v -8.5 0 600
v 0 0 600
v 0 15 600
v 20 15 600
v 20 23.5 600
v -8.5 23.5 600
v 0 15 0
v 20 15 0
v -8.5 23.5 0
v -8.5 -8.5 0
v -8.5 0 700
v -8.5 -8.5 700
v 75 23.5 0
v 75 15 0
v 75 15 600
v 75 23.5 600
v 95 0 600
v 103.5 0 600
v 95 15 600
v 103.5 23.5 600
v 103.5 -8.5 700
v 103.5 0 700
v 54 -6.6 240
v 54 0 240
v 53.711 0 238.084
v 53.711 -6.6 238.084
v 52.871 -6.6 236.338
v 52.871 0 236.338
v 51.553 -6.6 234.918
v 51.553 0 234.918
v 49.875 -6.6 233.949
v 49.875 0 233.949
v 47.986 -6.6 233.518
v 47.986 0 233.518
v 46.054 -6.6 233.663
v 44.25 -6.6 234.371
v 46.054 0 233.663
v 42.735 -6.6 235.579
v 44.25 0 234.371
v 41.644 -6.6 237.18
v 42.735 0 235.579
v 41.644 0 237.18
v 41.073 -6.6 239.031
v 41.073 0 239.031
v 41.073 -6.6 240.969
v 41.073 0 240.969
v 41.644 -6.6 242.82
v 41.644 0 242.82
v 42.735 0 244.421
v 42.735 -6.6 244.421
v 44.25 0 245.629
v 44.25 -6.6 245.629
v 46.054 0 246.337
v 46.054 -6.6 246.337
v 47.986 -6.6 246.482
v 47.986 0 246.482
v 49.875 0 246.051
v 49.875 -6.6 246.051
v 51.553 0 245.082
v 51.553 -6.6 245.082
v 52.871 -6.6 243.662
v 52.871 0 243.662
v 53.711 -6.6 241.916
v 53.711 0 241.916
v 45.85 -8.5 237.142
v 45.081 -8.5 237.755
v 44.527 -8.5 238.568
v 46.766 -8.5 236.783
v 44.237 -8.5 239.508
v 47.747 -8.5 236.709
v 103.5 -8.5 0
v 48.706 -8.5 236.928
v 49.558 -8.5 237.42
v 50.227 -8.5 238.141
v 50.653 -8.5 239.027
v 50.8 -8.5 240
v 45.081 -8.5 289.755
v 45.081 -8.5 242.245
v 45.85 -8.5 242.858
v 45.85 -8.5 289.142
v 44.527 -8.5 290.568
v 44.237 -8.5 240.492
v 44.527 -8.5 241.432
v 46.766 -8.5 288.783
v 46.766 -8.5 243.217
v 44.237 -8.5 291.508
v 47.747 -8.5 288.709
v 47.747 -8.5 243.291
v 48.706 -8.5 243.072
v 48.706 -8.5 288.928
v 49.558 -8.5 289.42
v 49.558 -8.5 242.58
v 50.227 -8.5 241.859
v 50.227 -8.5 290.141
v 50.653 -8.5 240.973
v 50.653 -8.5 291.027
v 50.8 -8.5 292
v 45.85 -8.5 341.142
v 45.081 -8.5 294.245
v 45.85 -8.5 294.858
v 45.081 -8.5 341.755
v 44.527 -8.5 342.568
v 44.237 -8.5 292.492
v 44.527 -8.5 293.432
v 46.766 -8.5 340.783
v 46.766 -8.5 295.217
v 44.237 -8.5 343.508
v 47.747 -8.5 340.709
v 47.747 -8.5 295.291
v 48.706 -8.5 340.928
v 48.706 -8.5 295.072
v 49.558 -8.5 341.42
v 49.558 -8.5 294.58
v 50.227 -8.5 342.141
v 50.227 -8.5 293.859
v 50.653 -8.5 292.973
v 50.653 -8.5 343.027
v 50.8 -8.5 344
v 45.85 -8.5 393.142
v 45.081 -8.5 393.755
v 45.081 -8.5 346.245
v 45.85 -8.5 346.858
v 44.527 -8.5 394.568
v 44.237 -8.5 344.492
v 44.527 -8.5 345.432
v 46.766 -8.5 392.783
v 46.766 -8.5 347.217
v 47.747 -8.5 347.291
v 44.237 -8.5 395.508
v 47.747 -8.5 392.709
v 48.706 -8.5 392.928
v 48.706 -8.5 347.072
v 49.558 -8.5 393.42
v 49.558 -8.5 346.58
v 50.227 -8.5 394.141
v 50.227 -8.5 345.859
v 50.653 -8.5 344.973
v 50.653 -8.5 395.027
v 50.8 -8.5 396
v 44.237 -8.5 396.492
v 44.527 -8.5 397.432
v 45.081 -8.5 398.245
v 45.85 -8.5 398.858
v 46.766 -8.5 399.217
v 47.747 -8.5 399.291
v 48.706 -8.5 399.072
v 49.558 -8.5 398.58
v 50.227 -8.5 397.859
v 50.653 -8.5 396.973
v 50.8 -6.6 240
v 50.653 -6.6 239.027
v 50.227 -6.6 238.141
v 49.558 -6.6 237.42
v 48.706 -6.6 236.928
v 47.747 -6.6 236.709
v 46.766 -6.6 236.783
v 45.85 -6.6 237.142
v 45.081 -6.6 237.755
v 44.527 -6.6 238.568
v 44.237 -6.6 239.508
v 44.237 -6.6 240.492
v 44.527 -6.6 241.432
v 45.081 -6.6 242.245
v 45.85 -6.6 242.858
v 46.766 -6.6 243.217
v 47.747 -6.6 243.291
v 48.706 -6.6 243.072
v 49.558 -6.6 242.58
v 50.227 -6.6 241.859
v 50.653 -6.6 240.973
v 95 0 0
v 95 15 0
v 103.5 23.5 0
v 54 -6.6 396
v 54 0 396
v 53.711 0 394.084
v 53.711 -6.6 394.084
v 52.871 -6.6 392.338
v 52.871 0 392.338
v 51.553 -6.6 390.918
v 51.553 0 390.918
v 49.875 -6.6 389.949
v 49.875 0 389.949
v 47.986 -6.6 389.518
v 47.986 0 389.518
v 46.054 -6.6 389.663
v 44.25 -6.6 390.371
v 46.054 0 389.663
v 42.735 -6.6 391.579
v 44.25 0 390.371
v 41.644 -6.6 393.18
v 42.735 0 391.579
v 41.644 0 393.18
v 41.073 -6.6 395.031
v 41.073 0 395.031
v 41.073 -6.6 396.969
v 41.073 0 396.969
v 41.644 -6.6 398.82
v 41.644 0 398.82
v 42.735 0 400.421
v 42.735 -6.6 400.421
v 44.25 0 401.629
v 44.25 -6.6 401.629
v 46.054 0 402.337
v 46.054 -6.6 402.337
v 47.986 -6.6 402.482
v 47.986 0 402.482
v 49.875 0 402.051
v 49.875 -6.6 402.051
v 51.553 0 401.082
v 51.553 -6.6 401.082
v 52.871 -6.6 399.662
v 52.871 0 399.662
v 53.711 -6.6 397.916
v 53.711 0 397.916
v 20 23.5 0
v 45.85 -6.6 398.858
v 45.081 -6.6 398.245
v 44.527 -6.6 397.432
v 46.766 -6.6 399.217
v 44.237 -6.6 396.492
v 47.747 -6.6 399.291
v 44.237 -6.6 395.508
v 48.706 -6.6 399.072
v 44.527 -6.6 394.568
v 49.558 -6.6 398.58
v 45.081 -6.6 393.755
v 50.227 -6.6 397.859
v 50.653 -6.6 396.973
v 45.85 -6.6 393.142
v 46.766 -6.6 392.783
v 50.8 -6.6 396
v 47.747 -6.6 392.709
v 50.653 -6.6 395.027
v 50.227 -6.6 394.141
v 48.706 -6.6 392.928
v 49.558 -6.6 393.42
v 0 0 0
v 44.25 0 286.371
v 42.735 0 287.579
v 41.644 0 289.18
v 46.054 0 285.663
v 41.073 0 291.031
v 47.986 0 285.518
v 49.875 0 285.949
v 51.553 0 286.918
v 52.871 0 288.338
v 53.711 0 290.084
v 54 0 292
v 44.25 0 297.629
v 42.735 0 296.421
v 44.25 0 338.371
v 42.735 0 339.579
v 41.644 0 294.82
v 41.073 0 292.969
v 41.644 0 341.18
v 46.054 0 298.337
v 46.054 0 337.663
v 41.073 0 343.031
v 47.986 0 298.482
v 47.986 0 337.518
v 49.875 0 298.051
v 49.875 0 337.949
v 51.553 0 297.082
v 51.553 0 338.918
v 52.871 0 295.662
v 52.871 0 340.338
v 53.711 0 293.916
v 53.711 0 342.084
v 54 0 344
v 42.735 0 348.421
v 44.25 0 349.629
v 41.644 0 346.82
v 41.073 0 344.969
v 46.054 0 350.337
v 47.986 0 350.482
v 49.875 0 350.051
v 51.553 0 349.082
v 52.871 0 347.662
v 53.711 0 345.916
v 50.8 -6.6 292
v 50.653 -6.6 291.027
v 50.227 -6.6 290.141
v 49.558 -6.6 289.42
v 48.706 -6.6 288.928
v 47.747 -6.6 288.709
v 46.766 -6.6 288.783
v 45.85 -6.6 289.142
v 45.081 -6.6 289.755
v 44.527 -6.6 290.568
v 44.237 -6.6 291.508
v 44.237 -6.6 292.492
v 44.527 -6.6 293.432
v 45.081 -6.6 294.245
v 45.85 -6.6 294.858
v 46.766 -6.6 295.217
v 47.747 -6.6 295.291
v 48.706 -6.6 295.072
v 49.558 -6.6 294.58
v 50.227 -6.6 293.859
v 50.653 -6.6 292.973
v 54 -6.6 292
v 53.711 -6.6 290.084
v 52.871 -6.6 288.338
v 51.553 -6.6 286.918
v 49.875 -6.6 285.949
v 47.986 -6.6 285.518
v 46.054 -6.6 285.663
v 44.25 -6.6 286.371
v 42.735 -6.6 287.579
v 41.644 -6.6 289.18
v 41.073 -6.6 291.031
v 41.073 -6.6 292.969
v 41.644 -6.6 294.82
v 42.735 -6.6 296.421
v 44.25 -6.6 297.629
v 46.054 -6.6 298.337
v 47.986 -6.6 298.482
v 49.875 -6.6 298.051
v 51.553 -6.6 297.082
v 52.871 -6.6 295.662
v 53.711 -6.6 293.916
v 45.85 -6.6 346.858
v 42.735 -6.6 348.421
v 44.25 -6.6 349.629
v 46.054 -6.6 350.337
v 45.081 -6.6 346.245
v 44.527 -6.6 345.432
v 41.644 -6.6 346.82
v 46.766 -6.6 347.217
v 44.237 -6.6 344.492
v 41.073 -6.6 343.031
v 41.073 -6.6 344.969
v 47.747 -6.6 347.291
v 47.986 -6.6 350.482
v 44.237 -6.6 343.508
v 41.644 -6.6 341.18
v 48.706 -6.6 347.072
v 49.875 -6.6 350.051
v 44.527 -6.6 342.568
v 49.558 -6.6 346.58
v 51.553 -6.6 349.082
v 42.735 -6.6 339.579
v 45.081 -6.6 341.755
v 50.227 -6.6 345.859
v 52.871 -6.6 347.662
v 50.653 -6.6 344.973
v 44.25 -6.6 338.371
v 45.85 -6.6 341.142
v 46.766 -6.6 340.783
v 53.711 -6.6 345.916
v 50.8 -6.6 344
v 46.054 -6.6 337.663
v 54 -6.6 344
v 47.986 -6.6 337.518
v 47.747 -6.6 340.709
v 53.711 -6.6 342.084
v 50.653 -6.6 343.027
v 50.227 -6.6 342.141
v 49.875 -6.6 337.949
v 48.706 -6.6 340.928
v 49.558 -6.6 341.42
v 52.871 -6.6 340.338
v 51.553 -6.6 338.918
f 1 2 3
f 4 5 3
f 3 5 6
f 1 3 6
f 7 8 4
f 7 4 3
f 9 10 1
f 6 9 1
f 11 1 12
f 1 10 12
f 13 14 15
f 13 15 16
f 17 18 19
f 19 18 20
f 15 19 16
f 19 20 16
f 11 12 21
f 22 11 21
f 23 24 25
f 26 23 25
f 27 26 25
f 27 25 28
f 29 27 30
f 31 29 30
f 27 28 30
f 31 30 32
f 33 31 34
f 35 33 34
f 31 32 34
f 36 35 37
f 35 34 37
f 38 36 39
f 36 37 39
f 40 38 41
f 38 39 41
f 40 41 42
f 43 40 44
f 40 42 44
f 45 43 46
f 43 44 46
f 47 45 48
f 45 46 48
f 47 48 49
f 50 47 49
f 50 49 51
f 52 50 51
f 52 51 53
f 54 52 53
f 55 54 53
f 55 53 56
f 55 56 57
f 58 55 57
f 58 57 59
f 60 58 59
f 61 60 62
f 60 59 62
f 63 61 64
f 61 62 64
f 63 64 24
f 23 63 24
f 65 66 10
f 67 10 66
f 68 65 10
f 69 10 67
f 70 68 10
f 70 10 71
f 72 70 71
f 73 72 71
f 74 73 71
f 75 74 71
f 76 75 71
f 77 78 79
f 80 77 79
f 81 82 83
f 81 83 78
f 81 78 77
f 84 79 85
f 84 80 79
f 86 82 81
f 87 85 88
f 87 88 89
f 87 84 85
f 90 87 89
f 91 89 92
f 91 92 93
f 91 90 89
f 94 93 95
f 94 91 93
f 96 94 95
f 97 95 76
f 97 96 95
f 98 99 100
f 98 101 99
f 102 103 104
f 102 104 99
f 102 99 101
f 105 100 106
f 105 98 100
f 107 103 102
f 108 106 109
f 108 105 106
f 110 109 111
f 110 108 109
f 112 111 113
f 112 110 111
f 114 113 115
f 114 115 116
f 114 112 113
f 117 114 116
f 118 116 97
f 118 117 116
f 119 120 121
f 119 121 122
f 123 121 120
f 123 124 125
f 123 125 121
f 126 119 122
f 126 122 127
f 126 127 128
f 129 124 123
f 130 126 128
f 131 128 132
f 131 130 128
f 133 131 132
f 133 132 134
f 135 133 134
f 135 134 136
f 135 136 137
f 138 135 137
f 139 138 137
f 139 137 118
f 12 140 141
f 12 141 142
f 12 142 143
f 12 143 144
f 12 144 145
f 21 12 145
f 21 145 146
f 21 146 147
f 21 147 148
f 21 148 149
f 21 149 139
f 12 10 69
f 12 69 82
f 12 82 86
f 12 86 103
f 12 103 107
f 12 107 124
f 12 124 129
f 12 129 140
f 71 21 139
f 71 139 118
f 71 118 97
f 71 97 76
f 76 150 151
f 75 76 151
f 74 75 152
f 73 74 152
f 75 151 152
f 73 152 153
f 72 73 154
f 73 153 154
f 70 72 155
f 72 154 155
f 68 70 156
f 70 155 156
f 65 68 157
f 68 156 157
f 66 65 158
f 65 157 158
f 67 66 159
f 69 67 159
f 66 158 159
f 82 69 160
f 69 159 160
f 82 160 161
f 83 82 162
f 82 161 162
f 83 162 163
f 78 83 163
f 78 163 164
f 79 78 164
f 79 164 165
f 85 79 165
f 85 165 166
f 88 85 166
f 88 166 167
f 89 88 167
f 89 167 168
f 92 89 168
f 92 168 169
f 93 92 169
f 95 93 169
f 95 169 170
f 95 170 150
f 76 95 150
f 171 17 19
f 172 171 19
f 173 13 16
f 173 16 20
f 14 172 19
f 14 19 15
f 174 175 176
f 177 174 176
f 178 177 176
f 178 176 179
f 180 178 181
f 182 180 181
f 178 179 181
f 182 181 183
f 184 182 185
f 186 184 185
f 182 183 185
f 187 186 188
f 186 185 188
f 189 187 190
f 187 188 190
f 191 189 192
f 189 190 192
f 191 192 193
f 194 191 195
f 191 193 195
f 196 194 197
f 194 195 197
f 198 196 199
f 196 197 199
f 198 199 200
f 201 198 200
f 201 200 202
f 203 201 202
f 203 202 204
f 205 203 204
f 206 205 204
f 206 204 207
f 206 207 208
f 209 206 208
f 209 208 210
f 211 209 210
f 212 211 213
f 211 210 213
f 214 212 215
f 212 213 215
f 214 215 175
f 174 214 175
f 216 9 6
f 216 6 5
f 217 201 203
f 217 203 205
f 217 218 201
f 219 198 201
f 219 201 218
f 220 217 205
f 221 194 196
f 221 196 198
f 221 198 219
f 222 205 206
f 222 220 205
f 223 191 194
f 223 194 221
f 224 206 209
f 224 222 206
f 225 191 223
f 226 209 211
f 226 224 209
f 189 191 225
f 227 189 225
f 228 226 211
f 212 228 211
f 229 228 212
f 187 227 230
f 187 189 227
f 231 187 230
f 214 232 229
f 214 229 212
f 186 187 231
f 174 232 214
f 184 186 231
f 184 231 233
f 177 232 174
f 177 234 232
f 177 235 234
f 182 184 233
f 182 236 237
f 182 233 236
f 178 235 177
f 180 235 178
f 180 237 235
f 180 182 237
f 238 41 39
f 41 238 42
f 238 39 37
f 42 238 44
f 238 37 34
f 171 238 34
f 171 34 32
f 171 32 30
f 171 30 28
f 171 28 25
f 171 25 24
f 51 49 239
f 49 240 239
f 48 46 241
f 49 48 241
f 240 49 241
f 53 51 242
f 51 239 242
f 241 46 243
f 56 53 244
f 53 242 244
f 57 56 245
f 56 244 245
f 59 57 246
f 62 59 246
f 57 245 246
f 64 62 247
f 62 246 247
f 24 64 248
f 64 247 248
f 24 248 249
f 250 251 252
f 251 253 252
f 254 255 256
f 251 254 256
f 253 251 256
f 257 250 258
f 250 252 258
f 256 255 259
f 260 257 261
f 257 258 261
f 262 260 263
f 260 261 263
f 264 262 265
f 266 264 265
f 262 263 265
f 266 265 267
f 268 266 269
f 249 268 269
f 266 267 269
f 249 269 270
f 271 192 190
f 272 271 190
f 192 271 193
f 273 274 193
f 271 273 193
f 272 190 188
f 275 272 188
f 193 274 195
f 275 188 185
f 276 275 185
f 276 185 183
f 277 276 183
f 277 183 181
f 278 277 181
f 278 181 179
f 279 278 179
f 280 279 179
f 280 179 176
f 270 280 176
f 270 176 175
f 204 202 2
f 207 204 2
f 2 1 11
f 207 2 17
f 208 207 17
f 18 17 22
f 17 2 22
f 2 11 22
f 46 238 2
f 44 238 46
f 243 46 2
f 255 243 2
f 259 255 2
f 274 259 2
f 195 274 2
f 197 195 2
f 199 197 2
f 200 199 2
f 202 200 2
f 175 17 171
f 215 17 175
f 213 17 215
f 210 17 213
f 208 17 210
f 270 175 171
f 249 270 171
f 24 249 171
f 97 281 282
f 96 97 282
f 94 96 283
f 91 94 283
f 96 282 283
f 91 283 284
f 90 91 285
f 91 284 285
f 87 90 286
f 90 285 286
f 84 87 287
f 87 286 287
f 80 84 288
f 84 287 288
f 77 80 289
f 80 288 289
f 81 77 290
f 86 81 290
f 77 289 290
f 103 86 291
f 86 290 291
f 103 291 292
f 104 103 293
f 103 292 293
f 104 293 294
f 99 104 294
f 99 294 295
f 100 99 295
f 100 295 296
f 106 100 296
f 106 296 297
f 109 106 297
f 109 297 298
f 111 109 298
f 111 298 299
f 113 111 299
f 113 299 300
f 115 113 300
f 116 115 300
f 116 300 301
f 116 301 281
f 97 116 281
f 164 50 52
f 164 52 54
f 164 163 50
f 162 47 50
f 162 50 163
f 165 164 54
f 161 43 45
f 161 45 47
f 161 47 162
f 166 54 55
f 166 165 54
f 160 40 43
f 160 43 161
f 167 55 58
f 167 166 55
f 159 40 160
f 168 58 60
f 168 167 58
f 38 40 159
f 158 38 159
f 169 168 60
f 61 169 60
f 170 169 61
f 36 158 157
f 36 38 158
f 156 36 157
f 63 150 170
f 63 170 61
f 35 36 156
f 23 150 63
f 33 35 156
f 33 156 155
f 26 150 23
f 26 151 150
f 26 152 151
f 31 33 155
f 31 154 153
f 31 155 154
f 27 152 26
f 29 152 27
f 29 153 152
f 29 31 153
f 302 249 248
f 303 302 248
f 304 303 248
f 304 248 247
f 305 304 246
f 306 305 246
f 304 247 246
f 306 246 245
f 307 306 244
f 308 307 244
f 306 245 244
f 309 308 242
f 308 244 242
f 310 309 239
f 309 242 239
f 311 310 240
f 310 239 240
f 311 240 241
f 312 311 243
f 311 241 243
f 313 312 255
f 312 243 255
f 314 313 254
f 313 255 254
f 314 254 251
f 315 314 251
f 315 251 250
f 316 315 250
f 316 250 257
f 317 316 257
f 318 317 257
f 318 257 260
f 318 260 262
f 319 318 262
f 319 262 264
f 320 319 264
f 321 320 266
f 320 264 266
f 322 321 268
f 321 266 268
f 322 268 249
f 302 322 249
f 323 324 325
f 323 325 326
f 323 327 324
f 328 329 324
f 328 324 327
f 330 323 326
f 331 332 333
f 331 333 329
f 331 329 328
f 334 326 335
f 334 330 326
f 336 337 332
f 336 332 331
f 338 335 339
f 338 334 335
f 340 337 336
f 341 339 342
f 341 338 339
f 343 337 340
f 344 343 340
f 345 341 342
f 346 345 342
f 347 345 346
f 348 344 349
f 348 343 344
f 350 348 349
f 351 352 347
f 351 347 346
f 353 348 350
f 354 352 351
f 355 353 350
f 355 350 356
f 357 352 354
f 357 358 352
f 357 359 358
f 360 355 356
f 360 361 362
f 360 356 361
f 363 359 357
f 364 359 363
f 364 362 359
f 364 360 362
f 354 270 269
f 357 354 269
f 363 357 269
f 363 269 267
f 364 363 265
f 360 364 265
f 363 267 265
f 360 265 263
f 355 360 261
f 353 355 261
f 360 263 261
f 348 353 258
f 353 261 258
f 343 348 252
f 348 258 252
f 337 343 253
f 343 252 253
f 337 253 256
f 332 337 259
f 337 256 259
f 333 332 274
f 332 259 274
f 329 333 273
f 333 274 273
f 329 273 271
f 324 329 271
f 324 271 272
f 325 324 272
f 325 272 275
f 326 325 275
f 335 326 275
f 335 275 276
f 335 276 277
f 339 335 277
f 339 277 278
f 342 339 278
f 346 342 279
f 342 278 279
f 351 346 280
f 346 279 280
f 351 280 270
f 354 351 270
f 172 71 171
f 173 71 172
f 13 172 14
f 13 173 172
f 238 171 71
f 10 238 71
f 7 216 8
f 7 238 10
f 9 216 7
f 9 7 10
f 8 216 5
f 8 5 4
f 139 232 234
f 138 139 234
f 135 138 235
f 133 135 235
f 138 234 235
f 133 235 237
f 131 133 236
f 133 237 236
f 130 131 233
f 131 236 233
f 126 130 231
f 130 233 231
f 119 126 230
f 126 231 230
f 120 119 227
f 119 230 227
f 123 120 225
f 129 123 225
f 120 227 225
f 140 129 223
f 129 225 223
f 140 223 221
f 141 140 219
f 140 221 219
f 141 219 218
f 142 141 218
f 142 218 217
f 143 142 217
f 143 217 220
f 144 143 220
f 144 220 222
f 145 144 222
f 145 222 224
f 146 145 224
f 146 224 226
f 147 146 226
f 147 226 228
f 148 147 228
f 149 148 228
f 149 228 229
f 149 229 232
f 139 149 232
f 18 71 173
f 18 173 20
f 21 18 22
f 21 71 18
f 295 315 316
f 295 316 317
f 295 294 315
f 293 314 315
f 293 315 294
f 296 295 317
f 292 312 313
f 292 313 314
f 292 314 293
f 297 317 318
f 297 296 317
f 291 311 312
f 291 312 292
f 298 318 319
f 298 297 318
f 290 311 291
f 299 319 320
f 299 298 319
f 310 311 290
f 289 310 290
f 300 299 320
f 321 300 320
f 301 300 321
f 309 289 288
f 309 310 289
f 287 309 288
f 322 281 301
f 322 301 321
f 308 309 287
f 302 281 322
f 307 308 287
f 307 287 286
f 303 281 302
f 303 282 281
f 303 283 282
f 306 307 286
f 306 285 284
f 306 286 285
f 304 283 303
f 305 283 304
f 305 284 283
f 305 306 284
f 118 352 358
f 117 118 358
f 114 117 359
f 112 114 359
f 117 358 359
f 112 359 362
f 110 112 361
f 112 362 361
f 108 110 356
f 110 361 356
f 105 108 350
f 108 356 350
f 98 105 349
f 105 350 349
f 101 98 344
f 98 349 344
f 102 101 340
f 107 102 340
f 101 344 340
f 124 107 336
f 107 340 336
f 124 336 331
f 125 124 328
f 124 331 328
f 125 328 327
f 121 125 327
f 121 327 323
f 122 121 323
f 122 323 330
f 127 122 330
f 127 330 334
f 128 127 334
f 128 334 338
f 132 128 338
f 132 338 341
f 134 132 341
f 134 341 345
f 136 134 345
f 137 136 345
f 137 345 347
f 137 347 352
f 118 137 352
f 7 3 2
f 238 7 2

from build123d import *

# Parameters (mm, degrees)
BOSS_EXTRUDE1_DEPTH = 600
SKETCH4_W           = 112
SKETCH4_H           = 100
BOSS_EXTRUDE2_DEPTH = 8.5
SKETCH6_R           = 3.3
CUT_EXTRUDE1_DEPTH  = 9.5
SKETCH7_R           = 6.5
CUT_EXTRUDE2_DEPTH  = 6.6


with BuildPart() as part:
    # Sketch1 → Boss-Extrude1 (new body)
    with BuildSketch(Plane.XY):
        Polygon((0, 0), (95, 0), (95, 15), (75, 15), (75, 23.5), (103.5, 23.5), (103.5, -8.5), (-8.5, -8.5), (-8.5, 23.5), (20, 23.5), (20, 15), (0, 15), align=None)
    extrude(amount=BOSS_EXTRUDE1_DEPTH)

    # Sketch4 → Boss-Extrude2 (add)
    with BuildSketch(Plane.XZ.offset(8.5)):
        with Locations((47.5, 650)):
            Rectangle(SKETCH4_W, SKETCH4_H)
    extrude(amount=-BOSS_EXTRUDE2_DEPTH)

    # Sketch6 → Cut-Extrude1 (cut, through all)
    with BuildSketch(Plane(origin=(0, 0, 0), x_dir=(1, 0, 0), z_dir=(0, 1, 0))):
        with Locations((47.5, -240)):
            Circle(SKETCH6_R)
        with Locations((47.5, -292)):
            Circle(SKETCH6_R)
        with Locations((47.5, -344)):
            Circle(SKETCH6_R)
        with Locations((47.5, -396)):
            Circle(SKETCH6_R)
    extrude(amount=-CUT_EXTRUDE1_DEPTH, mode=Mode.SUBTRACT)

    # Sketch7 → Cut-Extrude2 (cut)
    with BuildSketch(Plane(origin=(0, 0, 0), x_dir=(1, 0, 0), z_dir=(0, 1, 0))):
        with Locations((47.5, -240)):
            Circle(SKETCH7_R)
        with Locations((47.5, -292)):
            Circle(SKETCH7_R)
        with Locations((47.5, -344)):
            Circle(SKETCH7_R)
        with Locations((47.5, -396)):
            Circle(SKETCH7_R)
    extrude(amount=-CUT_EXTRUDE2_DEPTH, mode=Mode.SUBTRACT)


solid = part.part
